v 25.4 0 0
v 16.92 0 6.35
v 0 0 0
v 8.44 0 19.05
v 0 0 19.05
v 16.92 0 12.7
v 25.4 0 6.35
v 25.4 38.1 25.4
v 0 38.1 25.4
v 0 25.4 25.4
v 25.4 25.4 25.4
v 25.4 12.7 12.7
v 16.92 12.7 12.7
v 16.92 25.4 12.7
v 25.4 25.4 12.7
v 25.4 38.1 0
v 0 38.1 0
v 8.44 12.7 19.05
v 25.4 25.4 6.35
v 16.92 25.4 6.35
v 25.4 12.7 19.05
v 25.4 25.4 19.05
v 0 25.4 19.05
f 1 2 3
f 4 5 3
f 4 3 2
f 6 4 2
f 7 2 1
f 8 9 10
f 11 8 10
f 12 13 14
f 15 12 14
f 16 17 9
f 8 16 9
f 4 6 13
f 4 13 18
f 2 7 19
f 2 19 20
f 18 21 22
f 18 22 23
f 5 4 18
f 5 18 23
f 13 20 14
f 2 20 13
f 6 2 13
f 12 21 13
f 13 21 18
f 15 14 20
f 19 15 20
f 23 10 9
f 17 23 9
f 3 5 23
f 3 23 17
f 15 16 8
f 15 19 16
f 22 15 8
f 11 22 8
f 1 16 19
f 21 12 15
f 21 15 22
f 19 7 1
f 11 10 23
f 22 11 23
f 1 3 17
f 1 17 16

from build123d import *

# Parameters (mm, degrees)
F2_DEPTH = 25.4
F3_DEPTH = 25.4


with BuildPart() as f2:
    # F0 (on Front) → F2 (new body)
    with BuildSketch(Plane.XZ):
        Polygon((0, 6.35), (0, 0), (25.4, 0), (25.4, 6.35), (16.920075, 6.35), align=None)
        Polygon((0, 19.05), (0, 6.35), (16.920075, 6.35), (16.920075, 12.7), (8.440151, 19.05), align=None)
    extrude(amount=-F2_DEPTH)

    # F1 (on Right) → F3 (join)
    with BuildSketch(Plane.YZ):
        Polygon((0, 6.35), (0, 0), (38.1, 0), (38.1, 6.35), (25.4, 6.35), (12.7, 6.35), align=None)
        Polygon((25.4, 6.35), (38.1, 6.35), (38.1, 25.4), (25.4, 25.4), (25.4, 19.05), (12.7, 19.05), (12.7, 12.7), (25.4, 12.7), align=None)
    extrude(amount=F3_DEPTH)


solid = f2.part
